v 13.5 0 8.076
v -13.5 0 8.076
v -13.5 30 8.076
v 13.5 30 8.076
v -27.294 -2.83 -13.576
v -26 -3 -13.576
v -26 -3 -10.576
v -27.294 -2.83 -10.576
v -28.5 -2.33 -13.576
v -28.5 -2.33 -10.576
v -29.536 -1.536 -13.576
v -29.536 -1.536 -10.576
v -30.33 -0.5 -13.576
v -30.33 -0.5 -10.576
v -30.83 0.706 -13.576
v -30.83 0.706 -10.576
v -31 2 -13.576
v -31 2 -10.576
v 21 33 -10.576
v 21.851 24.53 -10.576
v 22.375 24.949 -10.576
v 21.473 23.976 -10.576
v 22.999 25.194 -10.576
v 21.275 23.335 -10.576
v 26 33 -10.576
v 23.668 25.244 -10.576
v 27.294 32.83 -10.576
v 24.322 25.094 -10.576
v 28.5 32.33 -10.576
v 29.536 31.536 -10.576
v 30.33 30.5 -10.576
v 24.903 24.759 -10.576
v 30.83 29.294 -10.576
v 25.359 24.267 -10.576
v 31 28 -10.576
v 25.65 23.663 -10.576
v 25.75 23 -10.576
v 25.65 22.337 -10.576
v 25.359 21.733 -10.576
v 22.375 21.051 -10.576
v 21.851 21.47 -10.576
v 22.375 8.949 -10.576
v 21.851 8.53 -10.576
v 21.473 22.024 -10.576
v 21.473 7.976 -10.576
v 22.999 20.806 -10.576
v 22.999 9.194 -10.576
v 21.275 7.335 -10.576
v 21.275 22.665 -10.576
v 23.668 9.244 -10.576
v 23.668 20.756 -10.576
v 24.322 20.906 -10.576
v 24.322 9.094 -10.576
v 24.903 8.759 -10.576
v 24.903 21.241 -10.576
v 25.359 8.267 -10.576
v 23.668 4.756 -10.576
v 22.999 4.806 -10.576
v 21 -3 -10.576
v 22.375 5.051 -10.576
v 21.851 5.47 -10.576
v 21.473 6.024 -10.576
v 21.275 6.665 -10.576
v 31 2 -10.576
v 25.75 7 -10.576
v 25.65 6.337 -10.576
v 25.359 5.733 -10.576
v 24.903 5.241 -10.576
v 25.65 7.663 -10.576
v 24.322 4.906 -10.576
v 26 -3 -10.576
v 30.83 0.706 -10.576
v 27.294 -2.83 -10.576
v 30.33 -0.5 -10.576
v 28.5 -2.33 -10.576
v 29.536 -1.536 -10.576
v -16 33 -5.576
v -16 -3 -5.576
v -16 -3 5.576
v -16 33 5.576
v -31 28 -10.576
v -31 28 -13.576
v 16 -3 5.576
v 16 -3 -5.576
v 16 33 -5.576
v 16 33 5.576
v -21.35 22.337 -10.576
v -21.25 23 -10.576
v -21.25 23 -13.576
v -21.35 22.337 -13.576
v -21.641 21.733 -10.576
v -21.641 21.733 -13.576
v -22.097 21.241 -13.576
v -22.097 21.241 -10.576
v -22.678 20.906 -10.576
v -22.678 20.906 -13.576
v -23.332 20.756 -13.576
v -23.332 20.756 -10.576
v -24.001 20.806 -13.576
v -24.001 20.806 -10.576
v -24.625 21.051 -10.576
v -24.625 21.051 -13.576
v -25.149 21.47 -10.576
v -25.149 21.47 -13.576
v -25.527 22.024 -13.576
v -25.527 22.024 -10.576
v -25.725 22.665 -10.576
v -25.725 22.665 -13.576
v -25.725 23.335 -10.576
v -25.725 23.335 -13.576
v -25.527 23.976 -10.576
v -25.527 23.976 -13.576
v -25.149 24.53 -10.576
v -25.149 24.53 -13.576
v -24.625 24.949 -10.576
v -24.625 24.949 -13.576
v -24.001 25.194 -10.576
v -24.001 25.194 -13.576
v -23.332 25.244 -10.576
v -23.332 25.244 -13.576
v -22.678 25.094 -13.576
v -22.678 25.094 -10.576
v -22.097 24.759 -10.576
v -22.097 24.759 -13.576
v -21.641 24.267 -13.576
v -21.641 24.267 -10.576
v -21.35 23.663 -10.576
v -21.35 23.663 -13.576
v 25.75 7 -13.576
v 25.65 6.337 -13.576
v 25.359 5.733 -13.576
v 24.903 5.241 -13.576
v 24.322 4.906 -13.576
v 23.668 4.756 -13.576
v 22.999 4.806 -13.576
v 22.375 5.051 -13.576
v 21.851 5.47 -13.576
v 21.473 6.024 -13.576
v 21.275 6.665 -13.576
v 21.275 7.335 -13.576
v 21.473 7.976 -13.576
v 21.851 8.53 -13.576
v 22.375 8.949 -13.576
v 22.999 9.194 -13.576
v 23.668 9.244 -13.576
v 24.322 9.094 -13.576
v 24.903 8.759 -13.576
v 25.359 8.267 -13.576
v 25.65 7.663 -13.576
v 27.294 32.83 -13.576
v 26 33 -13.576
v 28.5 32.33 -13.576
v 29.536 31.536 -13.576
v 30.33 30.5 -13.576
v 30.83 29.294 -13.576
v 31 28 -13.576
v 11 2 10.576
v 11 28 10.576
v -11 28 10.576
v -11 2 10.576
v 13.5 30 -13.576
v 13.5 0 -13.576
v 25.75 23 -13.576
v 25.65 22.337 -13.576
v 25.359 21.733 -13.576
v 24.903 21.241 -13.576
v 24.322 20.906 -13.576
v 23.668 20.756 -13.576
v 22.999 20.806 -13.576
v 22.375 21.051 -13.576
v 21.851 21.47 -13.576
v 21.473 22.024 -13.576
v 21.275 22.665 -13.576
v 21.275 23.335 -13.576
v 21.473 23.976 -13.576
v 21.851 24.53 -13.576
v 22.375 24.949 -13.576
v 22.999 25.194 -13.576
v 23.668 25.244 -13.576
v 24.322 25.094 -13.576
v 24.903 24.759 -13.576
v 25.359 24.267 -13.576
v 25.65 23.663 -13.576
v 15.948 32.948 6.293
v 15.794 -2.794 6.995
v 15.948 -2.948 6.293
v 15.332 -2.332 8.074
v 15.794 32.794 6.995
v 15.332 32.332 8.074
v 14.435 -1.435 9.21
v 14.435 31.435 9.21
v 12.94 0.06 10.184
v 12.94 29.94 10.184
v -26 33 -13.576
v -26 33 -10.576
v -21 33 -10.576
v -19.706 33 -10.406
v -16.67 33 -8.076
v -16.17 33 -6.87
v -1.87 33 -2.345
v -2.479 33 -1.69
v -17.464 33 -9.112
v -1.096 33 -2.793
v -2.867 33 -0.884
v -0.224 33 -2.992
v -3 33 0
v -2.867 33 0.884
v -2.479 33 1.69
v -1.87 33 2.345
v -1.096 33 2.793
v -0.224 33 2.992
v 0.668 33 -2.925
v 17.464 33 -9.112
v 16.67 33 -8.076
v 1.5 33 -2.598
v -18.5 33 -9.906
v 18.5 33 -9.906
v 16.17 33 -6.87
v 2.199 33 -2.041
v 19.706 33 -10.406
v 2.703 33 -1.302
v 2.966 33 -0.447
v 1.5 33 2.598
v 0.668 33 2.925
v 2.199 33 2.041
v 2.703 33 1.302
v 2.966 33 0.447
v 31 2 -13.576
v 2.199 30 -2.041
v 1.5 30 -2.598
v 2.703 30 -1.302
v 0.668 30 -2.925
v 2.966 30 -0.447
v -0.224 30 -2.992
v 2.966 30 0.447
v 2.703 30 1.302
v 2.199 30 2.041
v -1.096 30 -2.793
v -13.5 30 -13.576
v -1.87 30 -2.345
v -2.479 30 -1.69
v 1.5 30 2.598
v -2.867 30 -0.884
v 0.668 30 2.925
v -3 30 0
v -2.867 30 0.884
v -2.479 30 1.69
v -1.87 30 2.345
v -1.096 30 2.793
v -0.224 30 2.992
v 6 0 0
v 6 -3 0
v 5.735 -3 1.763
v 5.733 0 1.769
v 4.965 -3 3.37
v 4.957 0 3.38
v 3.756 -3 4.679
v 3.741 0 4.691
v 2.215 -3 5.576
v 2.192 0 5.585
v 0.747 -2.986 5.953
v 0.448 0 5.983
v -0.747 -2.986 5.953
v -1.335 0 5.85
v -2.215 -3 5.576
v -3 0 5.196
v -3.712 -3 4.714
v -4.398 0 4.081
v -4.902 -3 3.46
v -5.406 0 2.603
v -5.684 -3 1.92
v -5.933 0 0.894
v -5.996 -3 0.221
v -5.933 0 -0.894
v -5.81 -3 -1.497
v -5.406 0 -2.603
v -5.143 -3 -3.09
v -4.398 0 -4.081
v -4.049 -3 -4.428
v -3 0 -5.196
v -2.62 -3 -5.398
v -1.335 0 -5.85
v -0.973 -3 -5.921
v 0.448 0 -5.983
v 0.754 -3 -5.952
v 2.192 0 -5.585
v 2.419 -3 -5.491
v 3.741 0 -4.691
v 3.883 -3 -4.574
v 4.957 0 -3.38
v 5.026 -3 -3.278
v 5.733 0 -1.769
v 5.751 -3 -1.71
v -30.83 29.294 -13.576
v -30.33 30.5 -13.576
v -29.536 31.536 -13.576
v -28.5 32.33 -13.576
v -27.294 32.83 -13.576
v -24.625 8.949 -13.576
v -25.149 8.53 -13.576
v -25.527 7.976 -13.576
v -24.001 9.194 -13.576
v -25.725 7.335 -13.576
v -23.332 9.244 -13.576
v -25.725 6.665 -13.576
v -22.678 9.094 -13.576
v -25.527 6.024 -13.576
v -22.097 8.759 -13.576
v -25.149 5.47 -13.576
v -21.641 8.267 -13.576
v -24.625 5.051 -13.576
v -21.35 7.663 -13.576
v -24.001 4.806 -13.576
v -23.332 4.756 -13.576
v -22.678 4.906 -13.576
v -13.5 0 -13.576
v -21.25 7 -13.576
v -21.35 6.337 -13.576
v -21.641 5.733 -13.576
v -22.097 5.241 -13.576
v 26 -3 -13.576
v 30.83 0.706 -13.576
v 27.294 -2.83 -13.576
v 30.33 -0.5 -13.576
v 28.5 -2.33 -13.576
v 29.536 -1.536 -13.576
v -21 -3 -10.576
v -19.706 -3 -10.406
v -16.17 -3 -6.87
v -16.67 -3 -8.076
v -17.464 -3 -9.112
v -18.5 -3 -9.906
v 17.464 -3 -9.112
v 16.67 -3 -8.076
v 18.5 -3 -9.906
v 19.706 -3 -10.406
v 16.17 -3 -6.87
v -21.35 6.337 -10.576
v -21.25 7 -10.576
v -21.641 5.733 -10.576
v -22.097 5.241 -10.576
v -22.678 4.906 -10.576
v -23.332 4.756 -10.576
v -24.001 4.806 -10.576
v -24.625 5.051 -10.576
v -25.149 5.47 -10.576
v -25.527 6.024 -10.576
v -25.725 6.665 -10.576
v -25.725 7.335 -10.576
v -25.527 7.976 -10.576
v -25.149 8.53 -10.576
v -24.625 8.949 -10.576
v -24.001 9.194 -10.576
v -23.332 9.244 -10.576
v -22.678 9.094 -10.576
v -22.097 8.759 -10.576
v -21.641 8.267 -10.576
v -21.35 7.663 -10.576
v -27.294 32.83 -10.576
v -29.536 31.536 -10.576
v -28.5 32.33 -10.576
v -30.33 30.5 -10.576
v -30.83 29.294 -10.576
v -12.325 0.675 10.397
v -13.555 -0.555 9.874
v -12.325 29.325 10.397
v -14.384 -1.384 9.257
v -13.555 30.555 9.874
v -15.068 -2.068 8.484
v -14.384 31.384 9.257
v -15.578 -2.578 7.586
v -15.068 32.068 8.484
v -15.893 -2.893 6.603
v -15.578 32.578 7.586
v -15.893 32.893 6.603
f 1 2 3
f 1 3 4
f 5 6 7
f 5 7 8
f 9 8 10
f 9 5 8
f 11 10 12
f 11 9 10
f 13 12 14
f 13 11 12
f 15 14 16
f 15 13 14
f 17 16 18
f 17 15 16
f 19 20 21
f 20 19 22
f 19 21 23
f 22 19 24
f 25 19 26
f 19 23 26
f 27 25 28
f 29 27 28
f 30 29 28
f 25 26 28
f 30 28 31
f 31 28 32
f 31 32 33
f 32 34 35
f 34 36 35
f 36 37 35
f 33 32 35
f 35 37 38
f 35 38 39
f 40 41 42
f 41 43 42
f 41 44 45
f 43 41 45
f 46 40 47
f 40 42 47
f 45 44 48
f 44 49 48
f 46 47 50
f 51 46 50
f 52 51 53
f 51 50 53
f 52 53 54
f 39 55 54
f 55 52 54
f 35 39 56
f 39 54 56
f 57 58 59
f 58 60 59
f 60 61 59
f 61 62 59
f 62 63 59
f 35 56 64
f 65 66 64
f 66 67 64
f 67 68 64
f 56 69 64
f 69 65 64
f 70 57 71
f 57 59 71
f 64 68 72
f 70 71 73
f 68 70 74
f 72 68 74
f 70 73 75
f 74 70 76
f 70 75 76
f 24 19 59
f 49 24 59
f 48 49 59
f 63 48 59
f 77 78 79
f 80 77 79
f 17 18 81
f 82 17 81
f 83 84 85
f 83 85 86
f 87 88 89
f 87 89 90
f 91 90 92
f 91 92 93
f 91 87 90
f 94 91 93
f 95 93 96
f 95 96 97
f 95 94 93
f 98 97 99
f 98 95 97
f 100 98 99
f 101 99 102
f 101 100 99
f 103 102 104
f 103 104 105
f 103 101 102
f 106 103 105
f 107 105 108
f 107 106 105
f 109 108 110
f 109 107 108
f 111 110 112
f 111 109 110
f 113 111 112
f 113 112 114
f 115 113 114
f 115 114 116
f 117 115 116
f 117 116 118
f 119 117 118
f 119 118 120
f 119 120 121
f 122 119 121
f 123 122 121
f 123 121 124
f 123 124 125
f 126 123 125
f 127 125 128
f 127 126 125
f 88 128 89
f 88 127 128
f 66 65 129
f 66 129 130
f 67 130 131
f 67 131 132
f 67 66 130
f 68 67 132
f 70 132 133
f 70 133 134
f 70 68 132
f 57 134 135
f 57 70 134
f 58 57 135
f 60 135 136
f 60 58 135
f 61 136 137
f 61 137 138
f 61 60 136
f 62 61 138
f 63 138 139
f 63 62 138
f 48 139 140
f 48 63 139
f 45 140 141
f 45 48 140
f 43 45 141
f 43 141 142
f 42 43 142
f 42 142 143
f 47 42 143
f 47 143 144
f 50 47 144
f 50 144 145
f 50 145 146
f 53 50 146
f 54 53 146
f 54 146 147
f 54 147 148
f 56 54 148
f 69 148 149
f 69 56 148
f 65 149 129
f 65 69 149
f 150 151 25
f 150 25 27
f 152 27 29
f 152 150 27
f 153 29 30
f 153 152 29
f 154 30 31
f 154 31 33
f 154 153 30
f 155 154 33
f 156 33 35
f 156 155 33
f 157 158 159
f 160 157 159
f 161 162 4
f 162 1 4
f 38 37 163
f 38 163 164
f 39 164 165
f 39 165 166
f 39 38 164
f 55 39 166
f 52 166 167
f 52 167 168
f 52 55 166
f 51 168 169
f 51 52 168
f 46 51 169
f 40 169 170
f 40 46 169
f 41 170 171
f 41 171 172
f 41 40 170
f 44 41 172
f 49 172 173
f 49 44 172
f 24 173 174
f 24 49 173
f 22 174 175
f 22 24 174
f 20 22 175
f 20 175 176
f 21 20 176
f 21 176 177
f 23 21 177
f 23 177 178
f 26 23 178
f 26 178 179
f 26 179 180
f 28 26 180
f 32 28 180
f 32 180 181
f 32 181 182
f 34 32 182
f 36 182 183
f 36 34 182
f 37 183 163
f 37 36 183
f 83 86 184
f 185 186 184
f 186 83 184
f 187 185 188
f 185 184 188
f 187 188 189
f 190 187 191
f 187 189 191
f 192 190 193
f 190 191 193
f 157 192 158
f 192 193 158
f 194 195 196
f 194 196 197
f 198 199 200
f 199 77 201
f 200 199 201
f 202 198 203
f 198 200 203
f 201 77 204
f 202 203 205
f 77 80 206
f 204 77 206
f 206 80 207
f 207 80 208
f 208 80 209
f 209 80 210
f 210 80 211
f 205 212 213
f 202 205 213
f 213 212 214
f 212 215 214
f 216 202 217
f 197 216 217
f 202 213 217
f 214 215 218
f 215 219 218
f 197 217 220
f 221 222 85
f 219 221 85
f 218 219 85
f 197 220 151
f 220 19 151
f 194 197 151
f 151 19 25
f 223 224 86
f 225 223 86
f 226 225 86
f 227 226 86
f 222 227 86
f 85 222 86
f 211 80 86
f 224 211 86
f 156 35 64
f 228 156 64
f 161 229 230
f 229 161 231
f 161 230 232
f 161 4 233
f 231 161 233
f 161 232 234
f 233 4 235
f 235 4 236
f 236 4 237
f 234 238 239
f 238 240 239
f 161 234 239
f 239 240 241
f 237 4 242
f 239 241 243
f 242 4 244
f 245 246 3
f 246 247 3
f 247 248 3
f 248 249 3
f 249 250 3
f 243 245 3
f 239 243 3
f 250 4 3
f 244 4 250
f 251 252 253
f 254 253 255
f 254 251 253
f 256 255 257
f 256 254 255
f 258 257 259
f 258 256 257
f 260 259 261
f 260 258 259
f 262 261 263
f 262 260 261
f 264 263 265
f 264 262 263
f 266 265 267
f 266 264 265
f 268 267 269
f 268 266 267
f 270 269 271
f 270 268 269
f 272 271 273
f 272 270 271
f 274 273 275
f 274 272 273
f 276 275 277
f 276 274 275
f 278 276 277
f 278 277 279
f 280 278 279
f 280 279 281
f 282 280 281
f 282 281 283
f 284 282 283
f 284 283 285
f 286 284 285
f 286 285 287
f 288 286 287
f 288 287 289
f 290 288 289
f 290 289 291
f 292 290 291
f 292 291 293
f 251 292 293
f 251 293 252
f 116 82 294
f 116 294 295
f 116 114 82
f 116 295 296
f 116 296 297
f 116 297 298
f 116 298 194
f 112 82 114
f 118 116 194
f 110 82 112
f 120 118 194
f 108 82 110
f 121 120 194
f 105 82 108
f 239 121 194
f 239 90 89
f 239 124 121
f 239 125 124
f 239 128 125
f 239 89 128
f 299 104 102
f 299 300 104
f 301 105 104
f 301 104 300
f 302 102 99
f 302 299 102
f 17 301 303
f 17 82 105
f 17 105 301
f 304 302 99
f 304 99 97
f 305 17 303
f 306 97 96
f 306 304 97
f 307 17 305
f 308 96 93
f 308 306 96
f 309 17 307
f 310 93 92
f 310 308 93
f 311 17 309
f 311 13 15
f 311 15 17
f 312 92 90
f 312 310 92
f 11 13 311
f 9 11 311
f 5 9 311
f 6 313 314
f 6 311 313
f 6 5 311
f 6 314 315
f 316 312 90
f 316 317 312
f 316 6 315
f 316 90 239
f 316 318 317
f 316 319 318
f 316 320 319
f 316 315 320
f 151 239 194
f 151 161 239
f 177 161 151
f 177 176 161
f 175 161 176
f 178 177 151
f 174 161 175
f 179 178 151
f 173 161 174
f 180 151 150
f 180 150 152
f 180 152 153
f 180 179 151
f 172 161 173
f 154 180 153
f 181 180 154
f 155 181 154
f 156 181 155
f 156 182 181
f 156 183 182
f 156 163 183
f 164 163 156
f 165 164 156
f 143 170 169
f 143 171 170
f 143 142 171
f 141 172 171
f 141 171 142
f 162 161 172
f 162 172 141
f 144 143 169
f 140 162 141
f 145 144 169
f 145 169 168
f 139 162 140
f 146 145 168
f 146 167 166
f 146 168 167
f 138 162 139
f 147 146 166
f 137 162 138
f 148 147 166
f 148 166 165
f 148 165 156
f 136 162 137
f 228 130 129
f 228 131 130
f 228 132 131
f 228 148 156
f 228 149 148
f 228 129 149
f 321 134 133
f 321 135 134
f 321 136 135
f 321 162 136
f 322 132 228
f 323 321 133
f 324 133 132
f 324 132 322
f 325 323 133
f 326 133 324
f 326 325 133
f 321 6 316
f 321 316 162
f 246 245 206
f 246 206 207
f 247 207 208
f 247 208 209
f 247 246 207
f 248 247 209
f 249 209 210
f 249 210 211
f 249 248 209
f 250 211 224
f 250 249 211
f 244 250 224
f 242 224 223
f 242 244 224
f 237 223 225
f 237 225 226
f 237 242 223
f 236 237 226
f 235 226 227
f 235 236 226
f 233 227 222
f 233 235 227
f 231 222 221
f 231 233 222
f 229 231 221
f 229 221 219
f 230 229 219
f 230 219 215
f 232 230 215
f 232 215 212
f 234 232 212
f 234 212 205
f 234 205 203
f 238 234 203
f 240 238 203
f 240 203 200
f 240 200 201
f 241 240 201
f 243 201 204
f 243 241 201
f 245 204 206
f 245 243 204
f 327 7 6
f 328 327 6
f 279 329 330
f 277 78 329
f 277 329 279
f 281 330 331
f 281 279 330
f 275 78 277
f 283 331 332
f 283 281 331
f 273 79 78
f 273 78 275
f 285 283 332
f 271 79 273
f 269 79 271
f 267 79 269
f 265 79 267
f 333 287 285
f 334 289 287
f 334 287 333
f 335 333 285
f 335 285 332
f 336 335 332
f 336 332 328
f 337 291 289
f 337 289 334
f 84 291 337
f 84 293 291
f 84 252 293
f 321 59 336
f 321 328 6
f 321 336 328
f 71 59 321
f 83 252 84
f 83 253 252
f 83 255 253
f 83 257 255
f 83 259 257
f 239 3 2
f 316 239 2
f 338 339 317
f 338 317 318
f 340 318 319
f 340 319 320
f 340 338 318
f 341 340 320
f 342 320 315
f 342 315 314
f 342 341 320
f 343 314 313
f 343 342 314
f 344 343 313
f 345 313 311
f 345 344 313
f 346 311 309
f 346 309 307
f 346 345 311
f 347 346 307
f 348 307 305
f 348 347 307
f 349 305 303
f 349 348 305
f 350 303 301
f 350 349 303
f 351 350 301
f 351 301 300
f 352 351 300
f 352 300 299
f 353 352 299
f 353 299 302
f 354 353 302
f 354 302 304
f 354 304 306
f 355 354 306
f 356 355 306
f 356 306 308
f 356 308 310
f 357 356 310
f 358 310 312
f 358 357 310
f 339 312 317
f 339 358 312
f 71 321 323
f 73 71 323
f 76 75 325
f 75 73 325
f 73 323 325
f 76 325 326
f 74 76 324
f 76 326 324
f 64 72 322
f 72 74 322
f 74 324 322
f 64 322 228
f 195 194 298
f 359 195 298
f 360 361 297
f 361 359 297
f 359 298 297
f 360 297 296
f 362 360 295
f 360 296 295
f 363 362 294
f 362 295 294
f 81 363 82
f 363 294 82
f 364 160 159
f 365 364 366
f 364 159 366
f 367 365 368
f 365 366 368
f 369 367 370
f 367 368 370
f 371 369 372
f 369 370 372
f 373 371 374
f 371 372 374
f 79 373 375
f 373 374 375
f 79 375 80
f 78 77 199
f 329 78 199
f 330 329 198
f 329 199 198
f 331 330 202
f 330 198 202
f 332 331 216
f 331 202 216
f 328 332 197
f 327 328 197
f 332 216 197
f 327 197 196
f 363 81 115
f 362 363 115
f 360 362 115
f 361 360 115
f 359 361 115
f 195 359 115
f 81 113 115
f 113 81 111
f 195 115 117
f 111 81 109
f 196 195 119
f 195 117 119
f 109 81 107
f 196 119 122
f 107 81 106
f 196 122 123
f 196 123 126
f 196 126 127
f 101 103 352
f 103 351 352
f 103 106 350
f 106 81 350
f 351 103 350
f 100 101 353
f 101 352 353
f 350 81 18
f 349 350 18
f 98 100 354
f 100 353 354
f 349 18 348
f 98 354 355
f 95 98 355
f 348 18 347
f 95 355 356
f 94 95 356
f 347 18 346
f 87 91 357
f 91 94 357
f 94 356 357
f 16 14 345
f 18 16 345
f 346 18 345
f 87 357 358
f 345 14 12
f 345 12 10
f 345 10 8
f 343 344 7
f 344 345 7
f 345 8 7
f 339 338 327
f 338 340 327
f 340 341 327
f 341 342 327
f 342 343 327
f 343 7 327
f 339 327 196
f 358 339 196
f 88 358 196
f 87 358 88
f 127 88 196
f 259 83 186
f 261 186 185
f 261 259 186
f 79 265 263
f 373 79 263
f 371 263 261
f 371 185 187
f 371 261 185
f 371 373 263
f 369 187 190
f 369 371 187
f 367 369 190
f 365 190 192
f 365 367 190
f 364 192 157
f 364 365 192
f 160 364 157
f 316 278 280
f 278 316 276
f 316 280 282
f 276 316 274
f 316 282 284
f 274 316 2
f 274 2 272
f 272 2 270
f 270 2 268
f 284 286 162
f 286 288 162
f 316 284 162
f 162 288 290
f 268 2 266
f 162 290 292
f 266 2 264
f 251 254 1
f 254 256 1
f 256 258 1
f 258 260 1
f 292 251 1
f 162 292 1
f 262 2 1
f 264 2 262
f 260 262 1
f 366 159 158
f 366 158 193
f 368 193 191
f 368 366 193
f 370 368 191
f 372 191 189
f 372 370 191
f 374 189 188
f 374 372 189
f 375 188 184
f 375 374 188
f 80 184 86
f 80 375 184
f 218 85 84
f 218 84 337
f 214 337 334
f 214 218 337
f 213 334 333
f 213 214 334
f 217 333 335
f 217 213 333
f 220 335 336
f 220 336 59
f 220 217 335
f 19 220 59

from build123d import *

# Parameters (mm, degrees)
F0_W        = 32
F0_H        = 21.1520095187
F0_R        = 6
F1_DEPTH    = 30
F2_T        = -2.5
F3_DEPTH    = 3
F4_W        = 32
F4_H        = 21.1520095187
F4_R        = 3
F5_DEPTH    = 3
F6_R        = 2.25
F7_DEPTH    = 3
F8_T1_DEPTH = 36
F8_T3_DEPTH = 61
F8_T5_DEPTH = 57
F8_T7_DEPTH = 28


# Not quite as in the source:
# - a fillet or chamfer that OpenCascade refuses, or shapes differently, is made with other operations: its cross-section is extruded or revolved along the edge and cut away or added
# - a feature names something its author has since deleted; it is built from what else it names


with BuildPart() as f1:
    # F0 (on Front) → F1 (new body)
    with BuildSketch(Plane.XZ):
        Rectangle(F0_W, F0_H)
        Circle(F0_R, mode=Mode.SUBTRACT)
        Circle(F0_R)
    extrude(amount=-F1_DEPTH)

    # F2
    f2_openings = [f1.faces().sort_by_distance(p)[0] for p in [
        (0, 0, 0),
        (0, 30, 0),
        (0, 15, -10.576005),
    ]]
    offset(amount=F2_T, openings=f2_openings)

    # F0 (on Front) → F3 (join)
    with BuildSketch(Plane.XZ):
        Rectangle(F0_W, F0_H)
        Circle(F0_R, mode=Mode.SUBTRACT)
    extrude(amount=F3_DEPTH)

    # F4 (on face) → F5 (join)
    with BuildSketch(Plane(origin=(0, 30, 0), x_dir=(-1, 0, 0), z_dir=(0, 1, 0))):
        Rectangle(F4_W, F4_H)
        Circle(F4_R, mode=Mode.SUBTRACT)
    extrude(amount=F5_DEPTH)

    # F6 (on face) → F7 (join)
    with BuildSketch(Plane(origin=(0, 0, -10.5760047594), x_dir=(1, 0, 0), z_dir=(0, 0, -1))):
        Polygon((-16, 3), (-16, 0), (-13.5, 0), (13.5, 0), (16, 0), (16, 3), align=None)
        Polygon((-16, -33), (-16, 0), (-16, 3), (-31, 3), (-31, -33), align=None)
        with Locations((-23.5, -23)):
            Circle(F6_R, mode=Mode.SUBTRACT)
        with Locations((-23.5, -7)):
            Circle(F6_R, mode=Mode.SUBTRACT)
        Polygon((-13.5, 0), (-16, 0), (-16, -33), (16, -33), (16, 0), (13.5, 0), (13.5, -30), (-13.5, -30), align=None)
        Polygon((31, 3), (16, 3), (16, 0), (16, -33), (31, -33), align=None)
        with Locations((23.5, -23)):
            Circle(F6_R, mode=Mode.SUBTRACT)
        with Locations((23.5, -7)):
            Circle(F6_R, mode=Mode.SUBTRACT)
    extrude(amount=F7_DEPTH)

    # F8: fillet of radius 5 on 10 edges, made by hand

    # F8_s2 → F8_t1 (join)
    with BuildSketch(Plane.XZ.offset(-33)):
        with BuildLine():
            ThreePointArc((-16, -5.5760047594), (-17.4644660941, -9.1115386653), (-21, -10.5760047594))
            Line((-21, -10.5760047594), (-16, -10.5760047594))
            Line((-16, -10.5760047594), (-16, -5.5760047594))
        make_face()
        with BuildLine():
            ThreePointArc((16, -5.5760047594), (17.4644660941, -9.1115386653), (21, -10.5760047594))
            Line((21, -10.5760047594), (16, -10.5760047594))
            Line((16, -10.5760047594), (16, -5.5760047594))
        make_face()
    extrude(amount=F8_T1_DEPTH)

    # F8_s4 → F8_t3 (cut)
    with BuildSketch(Plane.XZ.offset(-45.5)):
        with BuildLine():
            ThreePointArc((-11, 10.5760047594), (-14.5355339059, 9.1115386653), (-16, 5.5760047594))
            Line((-16, 5.5760047594), (-16, 10.5760047594))
            Line((-16, 10.5760047594), (-11, 10.5760047594))
        make_face()
        with BuildLine():
            ThreePointArc((16, 5.5760047594), (14.5355339059, 9.1115386653), (11, 10.5760047594))
            Line((11, 10.5760047594), (16, 10.5760047594))
            Line((16, 10.5760047594), (16, 5.5760047594))
        make_face()
    extrude(amount=F8_T3_DEPTH, mode=Mode.SUBTRACT)

    # F8_s6 → F8_t5 (cut)
    with BuildSketch(Plane.YZ.offset(-28.5)):
        with BuildLine():
            ThreePointArc((-3, 5.5760047594), (-1.5355339059, 9.1115386653), (2, 10.5760047594))
            Line((2, 10.5760047594), (-3, 10.5760047594))
            Line((-3, 10.5760047594), (-3, 5.5760047594))
        make_face()
        with BuildLine():
            ThreePointArc((28, 10.5760047594), (31.5355339059, 9.1115386653), (33, 5.5760047594))
            Line((33, 5.5760047594), (33, 10.5760047594))
            Line((33, 10.5760047594), (28, 10.5760047594))
        make_face()
    extrude(amount=F8_T5_DEPTH, mode=Mode.SUBTRACT)

    # F8_s8 → F8_t7 (cut)
    with BuildSketch(Plane.XY.offset(-26.0760047594)):
        with BuildLine():
            ThreePointArc((26, -3), (29.5355339059, -1.5355339059), (31, 2))
            Line((31, 2), (31, -3))
            Line((31, -3), (26, -3))
        make_face()
        with BuildLine():
            ThreePointArc((26, 33), (29.5355339059, 31.5355339059), (31, 28))
            Line((31, 28), (31, 33))
            Line((31, 33), (26, 33))
        make_face()
        with BuildLine():
            ThreePointArc((-26, -3), (-29.5355339059, -1.5355339059), (-31, 2))
            Line((-31, 2), (-31, -3))
            Line((-31, -3), (-26, -3))
        make_face()
        with BuildLine():
            ThreePointArc((-26, 33), (-29.5355339059, 31.5355339059), (-31, 28))
            Line((-31, 28), (-31, 33))
            Line((-31, 33), (-26, 33))
        make_face()
    extrude(amount=F8_T7_DEPTH, mode=Mode.SUBTRACT)


solid = f1.part
